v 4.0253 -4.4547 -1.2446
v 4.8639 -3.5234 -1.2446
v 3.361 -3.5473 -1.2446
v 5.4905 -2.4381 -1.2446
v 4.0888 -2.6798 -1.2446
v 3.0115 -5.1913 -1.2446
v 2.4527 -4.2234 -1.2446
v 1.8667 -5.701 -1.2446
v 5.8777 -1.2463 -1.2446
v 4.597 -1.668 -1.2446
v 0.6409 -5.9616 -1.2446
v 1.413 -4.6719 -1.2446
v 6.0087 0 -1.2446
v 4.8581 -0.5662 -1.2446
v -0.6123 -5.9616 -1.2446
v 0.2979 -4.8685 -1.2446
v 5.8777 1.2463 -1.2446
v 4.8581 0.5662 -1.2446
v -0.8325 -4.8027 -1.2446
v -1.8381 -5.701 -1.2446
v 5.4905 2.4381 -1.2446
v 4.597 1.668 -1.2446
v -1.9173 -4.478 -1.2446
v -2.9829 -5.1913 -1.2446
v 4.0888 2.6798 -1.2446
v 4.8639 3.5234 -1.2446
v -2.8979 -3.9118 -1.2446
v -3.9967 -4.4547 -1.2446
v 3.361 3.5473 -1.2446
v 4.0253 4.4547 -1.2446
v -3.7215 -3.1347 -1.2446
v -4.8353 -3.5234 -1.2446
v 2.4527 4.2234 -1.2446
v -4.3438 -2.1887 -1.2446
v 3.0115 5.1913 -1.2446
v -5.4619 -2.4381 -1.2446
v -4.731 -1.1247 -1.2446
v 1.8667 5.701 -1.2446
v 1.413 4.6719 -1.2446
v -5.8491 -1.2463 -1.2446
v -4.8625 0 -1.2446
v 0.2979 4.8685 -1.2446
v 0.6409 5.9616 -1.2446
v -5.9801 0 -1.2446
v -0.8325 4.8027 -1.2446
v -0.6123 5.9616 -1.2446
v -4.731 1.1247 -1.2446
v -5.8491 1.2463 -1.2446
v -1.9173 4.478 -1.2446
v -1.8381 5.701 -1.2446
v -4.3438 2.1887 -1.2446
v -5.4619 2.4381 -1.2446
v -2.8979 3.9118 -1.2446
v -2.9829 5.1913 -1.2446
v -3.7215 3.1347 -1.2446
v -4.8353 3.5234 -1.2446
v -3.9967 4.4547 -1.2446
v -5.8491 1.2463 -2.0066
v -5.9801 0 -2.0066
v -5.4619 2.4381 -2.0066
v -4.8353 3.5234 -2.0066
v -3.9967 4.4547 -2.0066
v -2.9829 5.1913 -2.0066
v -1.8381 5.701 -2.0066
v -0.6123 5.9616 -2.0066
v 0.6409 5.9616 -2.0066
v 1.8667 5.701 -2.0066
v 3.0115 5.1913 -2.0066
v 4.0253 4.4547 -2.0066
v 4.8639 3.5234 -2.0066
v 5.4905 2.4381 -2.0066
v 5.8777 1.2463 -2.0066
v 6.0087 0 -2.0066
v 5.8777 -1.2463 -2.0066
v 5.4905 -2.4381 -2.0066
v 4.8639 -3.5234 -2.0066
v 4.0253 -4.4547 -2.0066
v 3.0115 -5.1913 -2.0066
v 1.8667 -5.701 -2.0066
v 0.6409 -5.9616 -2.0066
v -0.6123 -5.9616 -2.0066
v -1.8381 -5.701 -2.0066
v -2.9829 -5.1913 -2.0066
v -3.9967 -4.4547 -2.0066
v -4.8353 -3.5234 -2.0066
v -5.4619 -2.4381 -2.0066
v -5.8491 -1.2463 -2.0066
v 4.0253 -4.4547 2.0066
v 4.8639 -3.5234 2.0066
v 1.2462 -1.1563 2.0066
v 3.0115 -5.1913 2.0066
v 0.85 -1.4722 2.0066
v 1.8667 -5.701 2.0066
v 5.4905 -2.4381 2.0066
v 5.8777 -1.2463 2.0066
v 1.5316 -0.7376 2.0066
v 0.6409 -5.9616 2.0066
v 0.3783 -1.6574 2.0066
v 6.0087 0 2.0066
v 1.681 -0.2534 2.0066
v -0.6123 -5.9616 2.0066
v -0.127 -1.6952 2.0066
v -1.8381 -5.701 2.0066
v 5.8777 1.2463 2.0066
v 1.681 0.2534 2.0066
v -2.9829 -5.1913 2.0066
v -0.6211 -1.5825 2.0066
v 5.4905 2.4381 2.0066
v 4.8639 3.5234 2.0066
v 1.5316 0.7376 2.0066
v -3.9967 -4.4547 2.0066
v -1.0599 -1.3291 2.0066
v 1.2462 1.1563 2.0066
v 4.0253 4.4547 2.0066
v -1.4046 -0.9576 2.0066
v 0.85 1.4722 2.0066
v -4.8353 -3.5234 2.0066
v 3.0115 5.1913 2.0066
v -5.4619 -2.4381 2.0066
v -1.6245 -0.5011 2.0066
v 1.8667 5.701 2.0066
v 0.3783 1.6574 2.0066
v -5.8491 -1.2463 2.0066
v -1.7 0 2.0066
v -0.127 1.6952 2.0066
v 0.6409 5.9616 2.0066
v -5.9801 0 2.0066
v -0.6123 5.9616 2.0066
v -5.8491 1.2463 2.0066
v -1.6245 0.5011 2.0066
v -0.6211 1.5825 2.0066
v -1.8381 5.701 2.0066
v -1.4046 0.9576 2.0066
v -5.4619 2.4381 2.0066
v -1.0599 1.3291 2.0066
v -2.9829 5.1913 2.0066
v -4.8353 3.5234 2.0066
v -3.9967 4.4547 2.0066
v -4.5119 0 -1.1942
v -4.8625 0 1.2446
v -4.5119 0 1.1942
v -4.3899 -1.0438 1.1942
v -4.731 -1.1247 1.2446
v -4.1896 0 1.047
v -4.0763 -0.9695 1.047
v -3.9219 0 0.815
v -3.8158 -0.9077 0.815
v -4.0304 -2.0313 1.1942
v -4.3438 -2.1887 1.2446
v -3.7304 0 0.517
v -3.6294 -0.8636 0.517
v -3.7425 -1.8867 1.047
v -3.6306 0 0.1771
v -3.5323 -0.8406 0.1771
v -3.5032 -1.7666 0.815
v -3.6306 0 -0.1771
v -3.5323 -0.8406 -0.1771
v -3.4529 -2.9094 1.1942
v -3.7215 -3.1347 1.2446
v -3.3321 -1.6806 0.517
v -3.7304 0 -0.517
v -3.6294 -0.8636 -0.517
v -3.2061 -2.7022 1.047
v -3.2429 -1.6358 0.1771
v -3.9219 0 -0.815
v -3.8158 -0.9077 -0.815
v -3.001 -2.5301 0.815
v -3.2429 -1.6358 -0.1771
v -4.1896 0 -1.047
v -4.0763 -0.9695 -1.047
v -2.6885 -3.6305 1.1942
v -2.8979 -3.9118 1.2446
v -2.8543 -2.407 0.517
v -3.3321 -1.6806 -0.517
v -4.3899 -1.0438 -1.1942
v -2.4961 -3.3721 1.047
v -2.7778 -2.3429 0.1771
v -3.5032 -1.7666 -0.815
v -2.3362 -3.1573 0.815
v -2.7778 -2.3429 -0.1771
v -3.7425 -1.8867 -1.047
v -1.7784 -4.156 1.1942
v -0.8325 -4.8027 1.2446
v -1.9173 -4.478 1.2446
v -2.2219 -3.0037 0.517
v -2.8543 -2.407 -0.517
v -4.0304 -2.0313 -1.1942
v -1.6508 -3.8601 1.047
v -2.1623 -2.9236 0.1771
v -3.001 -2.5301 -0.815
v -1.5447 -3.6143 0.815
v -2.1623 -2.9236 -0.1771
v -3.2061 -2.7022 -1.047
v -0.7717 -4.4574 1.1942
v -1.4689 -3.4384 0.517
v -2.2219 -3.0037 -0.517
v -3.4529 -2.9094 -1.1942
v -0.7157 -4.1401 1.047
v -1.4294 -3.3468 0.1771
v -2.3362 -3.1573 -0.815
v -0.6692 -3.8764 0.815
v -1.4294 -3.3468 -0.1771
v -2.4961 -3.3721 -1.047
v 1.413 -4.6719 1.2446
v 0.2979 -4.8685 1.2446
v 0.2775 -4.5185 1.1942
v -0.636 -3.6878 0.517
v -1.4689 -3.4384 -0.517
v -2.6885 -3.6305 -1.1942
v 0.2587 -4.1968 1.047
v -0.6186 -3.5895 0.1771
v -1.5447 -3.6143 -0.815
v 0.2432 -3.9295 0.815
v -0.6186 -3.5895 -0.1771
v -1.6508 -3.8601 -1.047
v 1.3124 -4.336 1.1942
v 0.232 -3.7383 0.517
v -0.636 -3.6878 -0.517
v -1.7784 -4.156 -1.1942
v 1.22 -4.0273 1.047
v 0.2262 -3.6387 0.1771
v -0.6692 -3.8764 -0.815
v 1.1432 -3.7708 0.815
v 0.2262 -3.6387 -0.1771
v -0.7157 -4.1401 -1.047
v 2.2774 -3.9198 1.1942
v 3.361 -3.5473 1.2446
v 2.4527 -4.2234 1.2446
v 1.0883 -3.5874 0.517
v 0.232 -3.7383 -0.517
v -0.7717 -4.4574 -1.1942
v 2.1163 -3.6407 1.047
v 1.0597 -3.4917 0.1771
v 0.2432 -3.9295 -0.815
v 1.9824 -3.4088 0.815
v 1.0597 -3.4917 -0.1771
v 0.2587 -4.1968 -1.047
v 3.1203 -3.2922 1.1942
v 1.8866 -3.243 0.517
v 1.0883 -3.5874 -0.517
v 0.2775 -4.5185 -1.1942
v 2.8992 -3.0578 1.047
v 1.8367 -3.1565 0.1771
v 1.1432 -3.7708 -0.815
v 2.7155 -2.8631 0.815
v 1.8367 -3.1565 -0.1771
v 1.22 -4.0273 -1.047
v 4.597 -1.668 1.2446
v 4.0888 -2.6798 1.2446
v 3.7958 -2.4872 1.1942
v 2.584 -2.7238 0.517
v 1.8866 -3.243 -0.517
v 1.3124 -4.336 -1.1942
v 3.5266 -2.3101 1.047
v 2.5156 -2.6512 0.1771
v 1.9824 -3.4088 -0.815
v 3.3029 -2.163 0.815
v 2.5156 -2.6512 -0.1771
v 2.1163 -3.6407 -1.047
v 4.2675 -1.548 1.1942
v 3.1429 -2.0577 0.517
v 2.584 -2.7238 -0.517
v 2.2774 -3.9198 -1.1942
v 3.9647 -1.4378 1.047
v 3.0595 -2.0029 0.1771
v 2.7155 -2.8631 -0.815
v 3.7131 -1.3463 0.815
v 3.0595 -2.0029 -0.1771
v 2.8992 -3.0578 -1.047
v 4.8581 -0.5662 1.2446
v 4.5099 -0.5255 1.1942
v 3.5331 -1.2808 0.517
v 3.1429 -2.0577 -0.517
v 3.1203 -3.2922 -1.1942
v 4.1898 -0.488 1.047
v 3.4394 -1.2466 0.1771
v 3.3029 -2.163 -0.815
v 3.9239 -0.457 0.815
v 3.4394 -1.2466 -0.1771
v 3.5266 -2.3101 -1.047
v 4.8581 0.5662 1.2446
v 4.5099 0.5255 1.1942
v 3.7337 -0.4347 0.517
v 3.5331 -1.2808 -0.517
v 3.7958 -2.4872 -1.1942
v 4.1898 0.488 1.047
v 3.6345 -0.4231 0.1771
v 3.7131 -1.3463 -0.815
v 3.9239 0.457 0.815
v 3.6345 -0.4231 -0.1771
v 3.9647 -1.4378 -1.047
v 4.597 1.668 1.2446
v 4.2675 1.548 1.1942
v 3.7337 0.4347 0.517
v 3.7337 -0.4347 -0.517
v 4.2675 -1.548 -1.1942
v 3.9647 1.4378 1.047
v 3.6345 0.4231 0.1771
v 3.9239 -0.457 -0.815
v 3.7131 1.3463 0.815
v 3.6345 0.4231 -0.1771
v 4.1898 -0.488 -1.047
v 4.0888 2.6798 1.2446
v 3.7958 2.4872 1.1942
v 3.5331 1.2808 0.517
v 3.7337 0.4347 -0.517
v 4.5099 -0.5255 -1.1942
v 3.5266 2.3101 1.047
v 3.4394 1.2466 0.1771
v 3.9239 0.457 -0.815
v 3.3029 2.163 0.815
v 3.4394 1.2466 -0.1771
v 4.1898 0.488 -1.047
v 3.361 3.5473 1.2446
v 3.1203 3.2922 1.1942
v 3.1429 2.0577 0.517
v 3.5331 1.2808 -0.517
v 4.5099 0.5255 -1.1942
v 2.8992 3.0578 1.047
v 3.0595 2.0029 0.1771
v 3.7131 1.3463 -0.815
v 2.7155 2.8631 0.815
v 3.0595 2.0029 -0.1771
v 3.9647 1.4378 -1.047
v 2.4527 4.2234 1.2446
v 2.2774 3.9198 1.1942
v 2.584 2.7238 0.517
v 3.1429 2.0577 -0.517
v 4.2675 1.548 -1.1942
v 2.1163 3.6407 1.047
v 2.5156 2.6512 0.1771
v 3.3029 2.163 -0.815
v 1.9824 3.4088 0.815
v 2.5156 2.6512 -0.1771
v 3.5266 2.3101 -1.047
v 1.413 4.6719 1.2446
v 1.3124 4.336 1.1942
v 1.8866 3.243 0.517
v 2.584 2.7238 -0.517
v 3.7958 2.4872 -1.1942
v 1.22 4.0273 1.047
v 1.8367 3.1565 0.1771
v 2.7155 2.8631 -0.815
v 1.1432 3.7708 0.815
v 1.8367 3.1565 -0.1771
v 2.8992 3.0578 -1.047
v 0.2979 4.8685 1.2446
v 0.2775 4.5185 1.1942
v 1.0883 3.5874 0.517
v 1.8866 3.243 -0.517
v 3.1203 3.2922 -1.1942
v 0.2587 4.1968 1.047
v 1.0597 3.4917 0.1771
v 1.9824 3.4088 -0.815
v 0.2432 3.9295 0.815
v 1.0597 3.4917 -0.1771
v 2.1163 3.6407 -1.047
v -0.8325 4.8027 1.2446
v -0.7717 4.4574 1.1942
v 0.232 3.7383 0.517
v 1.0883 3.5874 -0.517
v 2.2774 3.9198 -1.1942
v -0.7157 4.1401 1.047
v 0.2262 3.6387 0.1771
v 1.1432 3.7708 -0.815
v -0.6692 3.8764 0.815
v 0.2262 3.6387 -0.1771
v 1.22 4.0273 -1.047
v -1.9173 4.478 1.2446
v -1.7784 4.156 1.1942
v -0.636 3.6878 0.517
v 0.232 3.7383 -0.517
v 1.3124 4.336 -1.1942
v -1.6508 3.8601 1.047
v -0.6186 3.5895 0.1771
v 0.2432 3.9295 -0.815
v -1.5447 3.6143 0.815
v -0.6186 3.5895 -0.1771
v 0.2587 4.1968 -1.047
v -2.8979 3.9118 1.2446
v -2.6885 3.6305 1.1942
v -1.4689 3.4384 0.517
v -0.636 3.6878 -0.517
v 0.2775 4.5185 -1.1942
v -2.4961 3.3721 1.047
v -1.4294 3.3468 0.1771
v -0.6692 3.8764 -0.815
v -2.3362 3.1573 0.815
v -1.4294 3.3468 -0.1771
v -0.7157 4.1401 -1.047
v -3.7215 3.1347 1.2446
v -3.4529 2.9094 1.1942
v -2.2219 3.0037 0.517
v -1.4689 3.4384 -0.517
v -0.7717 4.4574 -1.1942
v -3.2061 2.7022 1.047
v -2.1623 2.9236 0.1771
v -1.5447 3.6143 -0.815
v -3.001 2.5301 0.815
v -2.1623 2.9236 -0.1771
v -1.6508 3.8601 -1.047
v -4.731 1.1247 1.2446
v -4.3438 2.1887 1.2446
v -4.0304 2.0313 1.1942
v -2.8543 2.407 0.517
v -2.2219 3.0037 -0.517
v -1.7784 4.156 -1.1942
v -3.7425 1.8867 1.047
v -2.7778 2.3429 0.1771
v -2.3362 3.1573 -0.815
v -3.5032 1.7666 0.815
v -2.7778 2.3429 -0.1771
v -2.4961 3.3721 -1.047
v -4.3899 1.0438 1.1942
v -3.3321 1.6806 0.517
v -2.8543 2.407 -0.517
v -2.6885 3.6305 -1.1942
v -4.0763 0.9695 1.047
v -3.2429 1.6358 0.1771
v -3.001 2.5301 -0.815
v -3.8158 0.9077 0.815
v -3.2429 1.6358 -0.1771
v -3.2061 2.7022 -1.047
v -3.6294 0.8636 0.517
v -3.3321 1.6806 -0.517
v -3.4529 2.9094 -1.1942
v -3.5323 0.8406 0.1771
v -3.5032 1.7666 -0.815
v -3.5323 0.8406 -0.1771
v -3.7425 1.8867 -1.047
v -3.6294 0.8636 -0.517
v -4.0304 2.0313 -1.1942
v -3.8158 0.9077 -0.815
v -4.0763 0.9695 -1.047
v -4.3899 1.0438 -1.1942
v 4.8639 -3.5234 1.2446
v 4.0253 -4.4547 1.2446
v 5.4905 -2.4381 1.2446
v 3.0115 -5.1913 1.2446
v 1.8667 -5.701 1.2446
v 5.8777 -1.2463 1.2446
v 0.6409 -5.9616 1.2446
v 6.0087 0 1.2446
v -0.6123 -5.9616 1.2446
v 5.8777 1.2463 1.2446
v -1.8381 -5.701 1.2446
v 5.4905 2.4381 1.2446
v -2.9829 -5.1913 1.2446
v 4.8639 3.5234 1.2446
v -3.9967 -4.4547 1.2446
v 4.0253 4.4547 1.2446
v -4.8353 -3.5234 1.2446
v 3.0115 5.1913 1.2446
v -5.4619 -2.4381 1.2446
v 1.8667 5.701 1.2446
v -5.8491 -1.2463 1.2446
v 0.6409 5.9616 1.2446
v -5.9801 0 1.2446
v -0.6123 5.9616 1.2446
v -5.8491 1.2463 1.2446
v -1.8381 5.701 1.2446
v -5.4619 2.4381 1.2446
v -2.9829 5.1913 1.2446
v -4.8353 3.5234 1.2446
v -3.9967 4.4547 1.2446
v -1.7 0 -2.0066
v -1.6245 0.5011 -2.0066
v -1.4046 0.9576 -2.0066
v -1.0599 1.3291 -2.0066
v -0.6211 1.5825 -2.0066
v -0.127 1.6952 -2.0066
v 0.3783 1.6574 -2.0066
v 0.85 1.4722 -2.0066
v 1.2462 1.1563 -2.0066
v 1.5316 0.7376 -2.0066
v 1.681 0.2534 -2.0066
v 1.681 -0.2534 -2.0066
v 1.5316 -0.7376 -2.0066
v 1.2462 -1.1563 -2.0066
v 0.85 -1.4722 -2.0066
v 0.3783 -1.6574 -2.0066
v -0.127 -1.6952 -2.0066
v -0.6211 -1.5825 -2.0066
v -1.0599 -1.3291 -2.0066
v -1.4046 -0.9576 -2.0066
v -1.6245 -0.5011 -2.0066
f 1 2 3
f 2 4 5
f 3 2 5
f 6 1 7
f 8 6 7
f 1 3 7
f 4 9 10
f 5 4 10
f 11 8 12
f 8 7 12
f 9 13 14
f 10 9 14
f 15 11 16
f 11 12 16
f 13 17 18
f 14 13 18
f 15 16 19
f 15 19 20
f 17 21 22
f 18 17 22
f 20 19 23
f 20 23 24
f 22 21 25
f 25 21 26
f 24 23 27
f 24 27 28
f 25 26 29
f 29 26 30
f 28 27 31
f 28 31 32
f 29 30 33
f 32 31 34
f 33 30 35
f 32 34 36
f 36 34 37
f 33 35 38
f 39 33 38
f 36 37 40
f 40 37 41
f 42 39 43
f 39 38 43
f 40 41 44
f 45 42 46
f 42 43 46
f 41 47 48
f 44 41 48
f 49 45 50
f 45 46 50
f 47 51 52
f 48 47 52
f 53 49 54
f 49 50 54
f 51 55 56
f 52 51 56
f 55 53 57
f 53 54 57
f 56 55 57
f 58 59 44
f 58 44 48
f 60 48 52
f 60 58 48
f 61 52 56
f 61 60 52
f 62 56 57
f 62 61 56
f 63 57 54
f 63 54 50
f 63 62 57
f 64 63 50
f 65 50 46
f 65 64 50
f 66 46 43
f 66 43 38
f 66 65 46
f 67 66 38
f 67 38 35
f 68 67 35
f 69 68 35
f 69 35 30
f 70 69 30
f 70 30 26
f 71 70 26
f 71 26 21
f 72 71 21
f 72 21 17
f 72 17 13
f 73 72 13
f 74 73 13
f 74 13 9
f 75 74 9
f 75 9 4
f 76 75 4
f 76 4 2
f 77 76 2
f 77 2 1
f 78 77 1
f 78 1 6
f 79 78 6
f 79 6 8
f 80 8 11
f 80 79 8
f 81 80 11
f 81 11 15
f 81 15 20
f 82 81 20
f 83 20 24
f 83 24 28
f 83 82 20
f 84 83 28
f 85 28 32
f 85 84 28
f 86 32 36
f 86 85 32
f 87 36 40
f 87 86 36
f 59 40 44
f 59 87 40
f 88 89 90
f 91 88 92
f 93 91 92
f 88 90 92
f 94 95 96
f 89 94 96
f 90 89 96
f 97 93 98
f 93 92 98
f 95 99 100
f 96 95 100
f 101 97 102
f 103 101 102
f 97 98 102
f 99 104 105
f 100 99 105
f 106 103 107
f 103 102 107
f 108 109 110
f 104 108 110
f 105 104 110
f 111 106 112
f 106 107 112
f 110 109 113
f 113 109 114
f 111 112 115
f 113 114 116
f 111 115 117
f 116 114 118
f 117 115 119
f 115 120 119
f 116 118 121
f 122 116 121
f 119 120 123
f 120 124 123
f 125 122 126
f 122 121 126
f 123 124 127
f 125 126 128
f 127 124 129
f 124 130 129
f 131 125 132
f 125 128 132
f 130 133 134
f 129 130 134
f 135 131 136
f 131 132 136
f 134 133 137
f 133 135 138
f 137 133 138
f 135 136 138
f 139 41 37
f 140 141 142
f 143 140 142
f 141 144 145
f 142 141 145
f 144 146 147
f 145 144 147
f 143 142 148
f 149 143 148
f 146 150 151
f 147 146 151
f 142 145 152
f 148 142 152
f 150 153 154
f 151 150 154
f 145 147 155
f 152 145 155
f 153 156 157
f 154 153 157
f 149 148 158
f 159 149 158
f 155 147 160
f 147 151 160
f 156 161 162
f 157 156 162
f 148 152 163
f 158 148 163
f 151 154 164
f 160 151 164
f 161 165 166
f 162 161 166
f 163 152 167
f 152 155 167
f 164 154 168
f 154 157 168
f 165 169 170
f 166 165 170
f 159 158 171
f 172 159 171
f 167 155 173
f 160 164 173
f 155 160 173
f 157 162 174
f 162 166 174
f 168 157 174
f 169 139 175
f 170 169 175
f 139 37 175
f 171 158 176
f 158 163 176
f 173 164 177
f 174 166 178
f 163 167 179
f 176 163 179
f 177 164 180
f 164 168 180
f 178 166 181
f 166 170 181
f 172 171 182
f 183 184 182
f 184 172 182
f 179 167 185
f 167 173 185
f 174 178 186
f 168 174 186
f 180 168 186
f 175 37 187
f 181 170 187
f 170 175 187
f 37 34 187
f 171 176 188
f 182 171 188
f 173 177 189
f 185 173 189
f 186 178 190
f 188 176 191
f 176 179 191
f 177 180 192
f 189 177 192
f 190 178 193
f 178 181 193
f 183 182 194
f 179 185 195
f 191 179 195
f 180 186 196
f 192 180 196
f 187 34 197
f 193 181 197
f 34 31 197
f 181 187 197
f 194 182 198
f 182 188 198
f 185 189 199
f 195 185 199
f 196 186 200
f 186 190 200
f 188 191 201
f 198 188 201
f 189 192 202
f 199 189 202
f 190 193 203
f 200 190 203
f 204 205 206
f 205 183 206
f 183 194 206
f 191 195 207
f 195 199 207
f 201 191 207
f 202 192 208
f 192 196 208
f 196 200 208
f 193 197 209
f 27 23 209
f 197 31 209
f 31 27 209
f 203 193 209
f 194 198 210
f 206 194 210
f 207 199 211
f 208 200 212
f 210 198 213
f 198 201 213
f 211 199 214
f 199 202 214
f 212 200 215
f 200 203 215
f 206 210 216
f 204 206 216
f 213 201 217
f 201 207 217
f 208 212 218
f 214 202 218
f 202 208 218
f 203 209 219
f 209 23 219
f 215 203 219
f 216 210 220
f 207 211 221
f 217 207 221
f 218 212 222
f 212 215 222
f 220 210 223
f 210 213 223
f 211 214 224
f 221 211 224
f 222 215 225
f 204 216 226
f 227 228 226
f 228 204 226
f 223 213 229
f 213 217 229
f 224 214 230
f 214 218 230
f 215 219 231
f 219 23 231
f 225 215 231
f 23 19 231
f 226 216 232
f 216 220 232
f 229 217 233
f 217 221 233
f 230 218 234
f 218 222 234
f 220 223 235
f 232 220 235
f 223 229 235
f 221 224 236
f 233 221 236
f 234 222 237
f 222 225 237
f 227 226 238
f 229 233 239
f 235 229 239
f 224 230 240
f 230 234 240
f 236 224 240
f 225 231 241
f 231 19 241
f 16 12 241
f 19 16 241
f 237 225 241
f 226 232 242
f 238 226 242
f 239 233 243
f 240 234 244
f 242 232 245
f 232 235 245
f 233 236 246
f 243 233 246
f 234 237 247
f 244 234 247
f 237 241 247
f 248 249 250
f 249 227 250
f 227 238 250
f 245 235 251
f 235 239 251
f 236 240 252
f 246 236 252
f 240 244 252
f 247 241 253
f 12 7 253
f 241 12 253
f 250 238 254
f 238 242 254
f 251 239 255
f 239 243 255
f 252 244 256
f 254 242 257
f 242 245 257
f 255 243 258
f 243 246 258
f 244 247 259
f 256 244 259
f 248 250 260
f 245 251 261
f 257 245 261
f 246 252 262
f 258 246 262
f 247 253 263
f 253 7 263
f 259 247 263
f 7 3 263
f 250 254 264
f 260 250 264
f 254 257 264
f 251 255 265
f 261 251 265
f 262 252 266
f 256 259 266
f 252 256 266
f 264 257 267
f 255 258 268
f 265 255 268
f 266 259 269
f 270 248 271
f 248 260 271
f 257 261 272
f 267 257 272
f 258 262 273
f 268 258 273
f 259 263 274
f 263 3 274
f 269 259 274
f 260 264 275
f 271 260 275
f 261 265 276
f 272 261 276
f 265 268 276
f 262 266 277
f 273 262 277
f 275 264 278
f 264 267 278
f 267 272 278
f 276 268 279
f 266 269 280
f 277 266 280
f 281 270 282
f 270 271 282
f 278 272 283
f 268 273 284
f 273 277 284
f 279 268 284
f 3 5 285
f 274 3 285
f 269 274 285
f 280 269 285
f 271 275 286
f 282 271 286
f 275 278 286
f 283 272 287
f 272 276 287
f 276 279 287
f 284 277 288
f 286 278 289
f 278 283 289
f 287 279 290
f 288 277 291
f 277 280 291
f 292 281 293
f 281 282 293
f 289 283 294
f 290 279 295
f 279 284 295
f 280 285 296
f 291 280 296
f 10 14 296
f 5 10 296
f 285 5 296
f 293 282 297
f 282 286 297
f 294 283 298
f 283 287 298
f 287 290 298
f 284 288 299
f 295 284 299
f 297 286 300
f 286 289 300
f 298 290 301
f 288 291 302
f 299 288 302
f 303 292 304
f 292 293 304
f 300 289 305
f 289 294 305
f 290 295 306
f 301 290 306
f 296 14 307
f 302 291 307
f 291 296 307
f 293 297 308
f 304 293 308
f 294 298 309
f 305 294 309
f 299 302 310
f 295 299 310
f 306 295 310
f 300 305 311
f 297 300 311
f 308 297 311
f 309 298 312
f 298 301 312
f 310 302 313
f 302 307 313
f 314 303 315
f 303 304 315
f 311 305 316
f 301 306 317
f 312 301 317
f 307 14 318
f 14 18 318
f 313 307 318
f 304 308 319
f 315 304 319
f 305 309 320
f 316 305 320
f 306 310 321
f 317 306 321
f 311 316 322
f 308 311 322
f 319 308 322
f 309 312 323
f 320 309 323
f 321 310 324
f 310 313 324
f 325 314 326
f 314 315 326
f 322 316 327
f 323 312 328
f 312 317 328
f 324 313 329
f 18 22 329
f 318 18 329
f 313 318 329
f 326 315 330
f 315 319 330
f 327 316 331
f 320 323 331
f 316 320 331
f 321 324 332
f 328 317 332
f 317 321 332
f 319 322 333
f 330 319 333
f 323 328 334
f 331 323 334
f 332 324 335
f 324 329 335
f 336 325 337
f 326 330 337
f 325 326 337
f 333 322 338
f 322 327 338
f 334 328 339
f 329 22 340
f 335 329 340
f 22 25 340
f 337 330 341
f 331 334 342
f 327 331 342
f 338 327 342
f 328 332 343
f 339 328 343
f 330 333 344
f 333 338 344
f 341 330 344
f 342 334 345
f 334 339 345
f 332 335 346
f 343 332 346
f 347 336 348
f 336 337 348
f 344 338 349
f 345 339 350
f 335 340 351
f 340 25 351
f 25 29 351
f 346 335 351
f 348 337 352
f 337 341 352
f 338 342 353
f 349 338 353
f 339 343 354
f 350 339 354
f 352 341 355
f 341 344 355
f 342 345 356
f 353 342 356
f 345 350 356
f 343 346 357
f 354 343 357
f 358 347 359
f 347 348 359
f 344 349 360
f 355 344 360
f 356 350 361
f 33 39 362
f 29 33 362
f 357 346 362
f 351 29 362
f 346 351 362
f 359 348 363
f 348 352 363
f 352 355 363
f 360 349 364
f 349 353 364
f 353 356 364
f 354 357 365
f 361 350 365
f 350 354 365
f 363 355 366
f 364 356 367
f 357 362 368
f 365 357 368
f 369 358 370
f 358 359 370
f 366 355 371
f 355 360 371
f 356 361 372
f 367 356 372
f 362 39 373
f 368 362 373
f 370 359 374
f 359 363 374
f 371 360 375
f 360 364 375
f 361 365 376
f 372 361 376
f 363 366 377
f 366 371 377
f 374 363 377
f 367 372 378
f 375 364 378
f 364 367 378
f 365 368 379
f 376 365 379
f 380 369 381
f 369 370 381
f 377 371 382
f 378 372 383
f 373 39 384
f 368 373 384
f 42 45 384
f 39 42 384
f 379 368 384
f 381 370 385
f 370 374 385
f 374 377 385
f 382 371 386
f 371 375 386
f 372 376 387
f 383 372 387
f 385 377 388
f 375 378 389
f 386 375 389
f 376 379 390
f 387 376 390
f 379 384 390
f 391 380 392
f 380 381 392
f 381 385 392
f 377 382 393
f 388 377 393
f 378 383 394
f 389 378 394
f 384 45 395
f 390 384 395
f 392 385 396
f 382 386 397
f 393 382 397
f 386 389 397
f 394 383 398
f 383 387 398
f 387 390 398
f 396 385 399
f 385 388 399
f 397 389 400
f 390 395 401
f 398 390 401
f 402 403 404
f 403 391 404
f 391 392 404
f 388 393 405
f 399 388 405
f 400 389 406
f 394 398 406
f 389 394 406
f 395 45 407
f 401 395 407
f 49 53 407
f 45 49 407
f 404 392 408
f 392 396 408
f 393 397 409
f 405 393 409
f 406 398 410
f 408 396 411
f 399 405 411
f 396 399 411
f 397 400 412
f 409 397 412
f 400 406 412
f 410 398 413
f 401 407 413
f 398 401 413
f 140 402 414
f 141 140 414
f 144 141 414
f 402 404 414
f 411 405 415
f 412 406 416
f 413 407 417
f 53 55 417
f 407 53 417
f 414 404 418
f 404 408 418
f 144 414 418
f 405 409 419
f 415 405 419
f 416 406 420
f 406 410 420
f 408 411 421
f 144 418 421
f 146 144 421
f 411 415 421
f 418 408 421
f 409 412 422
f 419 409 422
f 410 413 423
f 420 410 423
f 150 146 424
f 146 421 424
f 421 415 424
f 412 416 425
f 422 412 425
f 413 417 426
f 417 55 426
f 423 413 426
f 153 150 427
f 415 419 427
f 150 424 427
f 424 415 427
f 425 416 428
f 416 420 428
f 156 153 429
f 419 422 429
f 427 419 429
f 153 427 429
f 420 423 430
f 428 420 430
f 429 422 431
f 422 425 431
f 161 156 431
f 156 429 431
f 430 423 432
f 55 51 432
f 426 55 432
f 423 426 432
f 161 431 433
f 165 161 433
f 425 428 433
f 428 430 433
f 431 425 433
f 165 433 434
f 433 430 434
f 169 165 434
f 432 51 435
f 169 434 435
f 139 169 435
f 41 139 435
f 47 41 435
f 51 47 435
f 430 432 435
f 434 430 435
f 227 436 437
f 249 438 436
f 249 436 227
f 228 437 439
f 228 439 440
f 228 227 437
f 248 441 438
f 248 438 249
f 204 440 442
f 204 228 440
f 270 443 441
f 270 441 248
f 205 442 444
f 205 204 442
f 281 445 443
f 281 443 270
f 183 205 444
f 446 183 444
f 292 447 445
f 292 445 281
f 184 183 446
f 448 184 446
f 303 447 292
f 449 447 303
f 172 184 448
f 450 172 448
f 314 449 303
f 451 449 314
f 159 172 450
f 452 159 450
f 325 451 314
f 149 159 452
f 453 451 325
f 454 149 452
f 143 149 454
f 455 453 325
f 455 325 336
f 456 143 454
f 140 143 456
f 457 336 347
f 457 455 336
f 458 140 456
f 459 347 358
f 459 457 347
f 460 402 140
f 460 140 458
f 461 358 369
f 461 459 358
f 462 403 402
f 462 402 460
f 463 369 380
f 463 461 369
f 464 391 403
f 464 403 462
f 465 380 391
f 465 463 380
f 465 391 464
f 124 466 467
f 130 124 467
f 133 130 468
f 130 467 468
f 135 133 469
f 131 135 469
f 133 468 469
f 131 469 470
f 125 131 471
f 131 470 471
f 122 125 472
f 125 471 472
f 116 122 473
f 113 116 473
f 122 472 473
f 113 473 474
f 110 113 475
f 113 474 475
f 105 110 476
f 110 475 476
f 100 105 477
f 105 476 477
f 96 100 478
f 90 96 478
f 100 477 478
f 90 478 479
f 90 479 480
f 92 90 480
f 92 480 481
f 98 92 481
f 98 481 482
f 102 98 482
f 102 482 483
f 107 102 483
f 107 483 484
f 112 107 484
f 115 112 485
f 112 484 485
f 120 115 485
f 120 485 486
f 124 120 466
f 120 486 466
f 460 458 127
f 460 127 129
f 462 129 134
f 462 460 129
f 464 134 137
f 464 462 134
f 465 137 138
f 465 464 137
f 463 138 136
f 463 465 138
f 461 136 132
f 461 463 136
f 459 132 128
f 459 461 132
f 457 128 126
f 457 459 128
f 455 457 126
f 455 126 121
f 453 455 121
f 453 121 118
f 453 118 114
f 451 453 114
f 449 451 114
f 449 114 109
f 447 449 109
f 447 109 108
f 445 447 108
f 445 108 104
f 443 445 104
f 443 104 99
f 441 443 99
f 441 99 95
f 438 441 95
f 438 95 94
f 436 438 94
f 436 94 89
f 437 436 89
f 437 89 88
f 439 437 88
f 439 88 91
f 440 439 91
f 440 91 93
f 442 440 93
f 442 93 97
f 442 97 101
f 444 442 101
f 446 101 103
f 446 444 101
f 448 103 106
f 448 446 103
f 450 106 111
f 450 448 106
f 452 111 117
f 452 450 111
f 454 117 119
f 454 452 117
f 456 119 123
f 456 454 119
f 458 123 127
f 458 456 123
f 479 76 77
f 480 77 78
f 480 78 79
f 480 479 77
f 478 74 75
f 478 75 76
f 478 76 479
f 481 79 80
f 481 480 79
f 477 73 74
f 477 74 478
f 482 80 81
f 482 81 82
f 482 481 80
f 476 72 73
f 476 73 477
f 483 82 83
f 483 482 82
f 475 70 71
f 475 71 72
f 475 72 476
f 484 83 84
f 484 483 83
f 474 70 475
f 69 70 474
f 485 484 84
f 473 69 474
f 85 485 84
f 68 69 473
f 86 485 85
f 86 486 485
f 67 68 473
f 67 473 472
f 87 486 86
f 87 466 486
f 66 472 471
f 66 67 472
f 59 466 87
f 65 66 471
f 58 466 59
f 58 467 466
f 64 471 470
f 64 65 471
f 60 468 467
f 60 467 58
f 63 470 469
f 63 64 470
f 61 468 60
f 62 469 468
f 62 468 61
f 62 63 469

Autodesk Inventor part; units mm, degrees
ref_plane "YZ Plane" through (0, 0, 0) normal (1, 0, 0) x (0, 1, 0)
ref_plane "XZ Plane" through (0, 0, 0) normal (0, 1, 0) x (-1, 0, 0)
sketch "Sketch1" plane through (0, 0, 0) normal (0, 1, 0) x (-1, 0, 0)
  line L0 (5.9801, -2.0066) -> (-0.0143, -2.0066)
  line L1 (5.9801, 2.0066) -> (-0.0143, 2.0066)
  line L2 (5.9801, 1.2446) -> (4.8625, 1.2446)
  line L3 (4.8625, 2.0066) -> (4.8625, -2.0066) construction
  line L4 (5.9801, 2.0066) -> (5.9801, 1.2446)
  line L5 (5.9801, -1.2446) -> (5.9801, -2.0066)
  line L6 (-0.0143, 2.0066) -> (-0.0143, -2.0066)
  line L7 (0, 0) -> (5.9944, 0) construction
  line L8 (3.6179, 2.0066) -> (3.6179, -2.0066) construction
  arc A0 (4.8625, 1.2446) -> (4.8625, -1.2446) centre (4.8625, 0) ccw
  line L9 (5.9801, -1.2446) -> (4.8625, -1.2446)
  line L10 (-0.0143, -1.2446) -> (-0.046, -1.2446)
  dimension "d4" = 0.762
  dimension "d6" = 2.0066
  dimension "d7" = 2.0066
  dimension "d9" = 1.1176
  dimension "d10" = 5.9944
  dimension "d11" = 5.9944
  dimension "d12" = 0.762
  dimension "d13" = 1.2446
  dimension "d15" = 1.2446
revolve "Revolution1" add sketch "Sketch1" angle 360 about axis through (0.0143, 0, 2.0066) along (0, 0, -1)
sketch "Sketch2" plane through (0.0143, 0, -2.0066) normal (0, 0, -1) x (-1, 0, 0)
  circle A0 centre (0.0143, 0) radius 1.7
  dimension "d17" = 3.4
extrude "Extrusion1" cut sketch "Sketch2" against normal through all
ref_plane "Work Plane1" through (0.0143, 0, 0) normal (0, 0, 1) x (1, 0, 0)
equation "\"d7\" = d6"
equation "\"d11\" = d10"
equation "\"d12\" = d4"
equation "\"d15\" = d14"
equation "\"d14\" = 1.2446"
properties part number "plastic pulley deep u"
